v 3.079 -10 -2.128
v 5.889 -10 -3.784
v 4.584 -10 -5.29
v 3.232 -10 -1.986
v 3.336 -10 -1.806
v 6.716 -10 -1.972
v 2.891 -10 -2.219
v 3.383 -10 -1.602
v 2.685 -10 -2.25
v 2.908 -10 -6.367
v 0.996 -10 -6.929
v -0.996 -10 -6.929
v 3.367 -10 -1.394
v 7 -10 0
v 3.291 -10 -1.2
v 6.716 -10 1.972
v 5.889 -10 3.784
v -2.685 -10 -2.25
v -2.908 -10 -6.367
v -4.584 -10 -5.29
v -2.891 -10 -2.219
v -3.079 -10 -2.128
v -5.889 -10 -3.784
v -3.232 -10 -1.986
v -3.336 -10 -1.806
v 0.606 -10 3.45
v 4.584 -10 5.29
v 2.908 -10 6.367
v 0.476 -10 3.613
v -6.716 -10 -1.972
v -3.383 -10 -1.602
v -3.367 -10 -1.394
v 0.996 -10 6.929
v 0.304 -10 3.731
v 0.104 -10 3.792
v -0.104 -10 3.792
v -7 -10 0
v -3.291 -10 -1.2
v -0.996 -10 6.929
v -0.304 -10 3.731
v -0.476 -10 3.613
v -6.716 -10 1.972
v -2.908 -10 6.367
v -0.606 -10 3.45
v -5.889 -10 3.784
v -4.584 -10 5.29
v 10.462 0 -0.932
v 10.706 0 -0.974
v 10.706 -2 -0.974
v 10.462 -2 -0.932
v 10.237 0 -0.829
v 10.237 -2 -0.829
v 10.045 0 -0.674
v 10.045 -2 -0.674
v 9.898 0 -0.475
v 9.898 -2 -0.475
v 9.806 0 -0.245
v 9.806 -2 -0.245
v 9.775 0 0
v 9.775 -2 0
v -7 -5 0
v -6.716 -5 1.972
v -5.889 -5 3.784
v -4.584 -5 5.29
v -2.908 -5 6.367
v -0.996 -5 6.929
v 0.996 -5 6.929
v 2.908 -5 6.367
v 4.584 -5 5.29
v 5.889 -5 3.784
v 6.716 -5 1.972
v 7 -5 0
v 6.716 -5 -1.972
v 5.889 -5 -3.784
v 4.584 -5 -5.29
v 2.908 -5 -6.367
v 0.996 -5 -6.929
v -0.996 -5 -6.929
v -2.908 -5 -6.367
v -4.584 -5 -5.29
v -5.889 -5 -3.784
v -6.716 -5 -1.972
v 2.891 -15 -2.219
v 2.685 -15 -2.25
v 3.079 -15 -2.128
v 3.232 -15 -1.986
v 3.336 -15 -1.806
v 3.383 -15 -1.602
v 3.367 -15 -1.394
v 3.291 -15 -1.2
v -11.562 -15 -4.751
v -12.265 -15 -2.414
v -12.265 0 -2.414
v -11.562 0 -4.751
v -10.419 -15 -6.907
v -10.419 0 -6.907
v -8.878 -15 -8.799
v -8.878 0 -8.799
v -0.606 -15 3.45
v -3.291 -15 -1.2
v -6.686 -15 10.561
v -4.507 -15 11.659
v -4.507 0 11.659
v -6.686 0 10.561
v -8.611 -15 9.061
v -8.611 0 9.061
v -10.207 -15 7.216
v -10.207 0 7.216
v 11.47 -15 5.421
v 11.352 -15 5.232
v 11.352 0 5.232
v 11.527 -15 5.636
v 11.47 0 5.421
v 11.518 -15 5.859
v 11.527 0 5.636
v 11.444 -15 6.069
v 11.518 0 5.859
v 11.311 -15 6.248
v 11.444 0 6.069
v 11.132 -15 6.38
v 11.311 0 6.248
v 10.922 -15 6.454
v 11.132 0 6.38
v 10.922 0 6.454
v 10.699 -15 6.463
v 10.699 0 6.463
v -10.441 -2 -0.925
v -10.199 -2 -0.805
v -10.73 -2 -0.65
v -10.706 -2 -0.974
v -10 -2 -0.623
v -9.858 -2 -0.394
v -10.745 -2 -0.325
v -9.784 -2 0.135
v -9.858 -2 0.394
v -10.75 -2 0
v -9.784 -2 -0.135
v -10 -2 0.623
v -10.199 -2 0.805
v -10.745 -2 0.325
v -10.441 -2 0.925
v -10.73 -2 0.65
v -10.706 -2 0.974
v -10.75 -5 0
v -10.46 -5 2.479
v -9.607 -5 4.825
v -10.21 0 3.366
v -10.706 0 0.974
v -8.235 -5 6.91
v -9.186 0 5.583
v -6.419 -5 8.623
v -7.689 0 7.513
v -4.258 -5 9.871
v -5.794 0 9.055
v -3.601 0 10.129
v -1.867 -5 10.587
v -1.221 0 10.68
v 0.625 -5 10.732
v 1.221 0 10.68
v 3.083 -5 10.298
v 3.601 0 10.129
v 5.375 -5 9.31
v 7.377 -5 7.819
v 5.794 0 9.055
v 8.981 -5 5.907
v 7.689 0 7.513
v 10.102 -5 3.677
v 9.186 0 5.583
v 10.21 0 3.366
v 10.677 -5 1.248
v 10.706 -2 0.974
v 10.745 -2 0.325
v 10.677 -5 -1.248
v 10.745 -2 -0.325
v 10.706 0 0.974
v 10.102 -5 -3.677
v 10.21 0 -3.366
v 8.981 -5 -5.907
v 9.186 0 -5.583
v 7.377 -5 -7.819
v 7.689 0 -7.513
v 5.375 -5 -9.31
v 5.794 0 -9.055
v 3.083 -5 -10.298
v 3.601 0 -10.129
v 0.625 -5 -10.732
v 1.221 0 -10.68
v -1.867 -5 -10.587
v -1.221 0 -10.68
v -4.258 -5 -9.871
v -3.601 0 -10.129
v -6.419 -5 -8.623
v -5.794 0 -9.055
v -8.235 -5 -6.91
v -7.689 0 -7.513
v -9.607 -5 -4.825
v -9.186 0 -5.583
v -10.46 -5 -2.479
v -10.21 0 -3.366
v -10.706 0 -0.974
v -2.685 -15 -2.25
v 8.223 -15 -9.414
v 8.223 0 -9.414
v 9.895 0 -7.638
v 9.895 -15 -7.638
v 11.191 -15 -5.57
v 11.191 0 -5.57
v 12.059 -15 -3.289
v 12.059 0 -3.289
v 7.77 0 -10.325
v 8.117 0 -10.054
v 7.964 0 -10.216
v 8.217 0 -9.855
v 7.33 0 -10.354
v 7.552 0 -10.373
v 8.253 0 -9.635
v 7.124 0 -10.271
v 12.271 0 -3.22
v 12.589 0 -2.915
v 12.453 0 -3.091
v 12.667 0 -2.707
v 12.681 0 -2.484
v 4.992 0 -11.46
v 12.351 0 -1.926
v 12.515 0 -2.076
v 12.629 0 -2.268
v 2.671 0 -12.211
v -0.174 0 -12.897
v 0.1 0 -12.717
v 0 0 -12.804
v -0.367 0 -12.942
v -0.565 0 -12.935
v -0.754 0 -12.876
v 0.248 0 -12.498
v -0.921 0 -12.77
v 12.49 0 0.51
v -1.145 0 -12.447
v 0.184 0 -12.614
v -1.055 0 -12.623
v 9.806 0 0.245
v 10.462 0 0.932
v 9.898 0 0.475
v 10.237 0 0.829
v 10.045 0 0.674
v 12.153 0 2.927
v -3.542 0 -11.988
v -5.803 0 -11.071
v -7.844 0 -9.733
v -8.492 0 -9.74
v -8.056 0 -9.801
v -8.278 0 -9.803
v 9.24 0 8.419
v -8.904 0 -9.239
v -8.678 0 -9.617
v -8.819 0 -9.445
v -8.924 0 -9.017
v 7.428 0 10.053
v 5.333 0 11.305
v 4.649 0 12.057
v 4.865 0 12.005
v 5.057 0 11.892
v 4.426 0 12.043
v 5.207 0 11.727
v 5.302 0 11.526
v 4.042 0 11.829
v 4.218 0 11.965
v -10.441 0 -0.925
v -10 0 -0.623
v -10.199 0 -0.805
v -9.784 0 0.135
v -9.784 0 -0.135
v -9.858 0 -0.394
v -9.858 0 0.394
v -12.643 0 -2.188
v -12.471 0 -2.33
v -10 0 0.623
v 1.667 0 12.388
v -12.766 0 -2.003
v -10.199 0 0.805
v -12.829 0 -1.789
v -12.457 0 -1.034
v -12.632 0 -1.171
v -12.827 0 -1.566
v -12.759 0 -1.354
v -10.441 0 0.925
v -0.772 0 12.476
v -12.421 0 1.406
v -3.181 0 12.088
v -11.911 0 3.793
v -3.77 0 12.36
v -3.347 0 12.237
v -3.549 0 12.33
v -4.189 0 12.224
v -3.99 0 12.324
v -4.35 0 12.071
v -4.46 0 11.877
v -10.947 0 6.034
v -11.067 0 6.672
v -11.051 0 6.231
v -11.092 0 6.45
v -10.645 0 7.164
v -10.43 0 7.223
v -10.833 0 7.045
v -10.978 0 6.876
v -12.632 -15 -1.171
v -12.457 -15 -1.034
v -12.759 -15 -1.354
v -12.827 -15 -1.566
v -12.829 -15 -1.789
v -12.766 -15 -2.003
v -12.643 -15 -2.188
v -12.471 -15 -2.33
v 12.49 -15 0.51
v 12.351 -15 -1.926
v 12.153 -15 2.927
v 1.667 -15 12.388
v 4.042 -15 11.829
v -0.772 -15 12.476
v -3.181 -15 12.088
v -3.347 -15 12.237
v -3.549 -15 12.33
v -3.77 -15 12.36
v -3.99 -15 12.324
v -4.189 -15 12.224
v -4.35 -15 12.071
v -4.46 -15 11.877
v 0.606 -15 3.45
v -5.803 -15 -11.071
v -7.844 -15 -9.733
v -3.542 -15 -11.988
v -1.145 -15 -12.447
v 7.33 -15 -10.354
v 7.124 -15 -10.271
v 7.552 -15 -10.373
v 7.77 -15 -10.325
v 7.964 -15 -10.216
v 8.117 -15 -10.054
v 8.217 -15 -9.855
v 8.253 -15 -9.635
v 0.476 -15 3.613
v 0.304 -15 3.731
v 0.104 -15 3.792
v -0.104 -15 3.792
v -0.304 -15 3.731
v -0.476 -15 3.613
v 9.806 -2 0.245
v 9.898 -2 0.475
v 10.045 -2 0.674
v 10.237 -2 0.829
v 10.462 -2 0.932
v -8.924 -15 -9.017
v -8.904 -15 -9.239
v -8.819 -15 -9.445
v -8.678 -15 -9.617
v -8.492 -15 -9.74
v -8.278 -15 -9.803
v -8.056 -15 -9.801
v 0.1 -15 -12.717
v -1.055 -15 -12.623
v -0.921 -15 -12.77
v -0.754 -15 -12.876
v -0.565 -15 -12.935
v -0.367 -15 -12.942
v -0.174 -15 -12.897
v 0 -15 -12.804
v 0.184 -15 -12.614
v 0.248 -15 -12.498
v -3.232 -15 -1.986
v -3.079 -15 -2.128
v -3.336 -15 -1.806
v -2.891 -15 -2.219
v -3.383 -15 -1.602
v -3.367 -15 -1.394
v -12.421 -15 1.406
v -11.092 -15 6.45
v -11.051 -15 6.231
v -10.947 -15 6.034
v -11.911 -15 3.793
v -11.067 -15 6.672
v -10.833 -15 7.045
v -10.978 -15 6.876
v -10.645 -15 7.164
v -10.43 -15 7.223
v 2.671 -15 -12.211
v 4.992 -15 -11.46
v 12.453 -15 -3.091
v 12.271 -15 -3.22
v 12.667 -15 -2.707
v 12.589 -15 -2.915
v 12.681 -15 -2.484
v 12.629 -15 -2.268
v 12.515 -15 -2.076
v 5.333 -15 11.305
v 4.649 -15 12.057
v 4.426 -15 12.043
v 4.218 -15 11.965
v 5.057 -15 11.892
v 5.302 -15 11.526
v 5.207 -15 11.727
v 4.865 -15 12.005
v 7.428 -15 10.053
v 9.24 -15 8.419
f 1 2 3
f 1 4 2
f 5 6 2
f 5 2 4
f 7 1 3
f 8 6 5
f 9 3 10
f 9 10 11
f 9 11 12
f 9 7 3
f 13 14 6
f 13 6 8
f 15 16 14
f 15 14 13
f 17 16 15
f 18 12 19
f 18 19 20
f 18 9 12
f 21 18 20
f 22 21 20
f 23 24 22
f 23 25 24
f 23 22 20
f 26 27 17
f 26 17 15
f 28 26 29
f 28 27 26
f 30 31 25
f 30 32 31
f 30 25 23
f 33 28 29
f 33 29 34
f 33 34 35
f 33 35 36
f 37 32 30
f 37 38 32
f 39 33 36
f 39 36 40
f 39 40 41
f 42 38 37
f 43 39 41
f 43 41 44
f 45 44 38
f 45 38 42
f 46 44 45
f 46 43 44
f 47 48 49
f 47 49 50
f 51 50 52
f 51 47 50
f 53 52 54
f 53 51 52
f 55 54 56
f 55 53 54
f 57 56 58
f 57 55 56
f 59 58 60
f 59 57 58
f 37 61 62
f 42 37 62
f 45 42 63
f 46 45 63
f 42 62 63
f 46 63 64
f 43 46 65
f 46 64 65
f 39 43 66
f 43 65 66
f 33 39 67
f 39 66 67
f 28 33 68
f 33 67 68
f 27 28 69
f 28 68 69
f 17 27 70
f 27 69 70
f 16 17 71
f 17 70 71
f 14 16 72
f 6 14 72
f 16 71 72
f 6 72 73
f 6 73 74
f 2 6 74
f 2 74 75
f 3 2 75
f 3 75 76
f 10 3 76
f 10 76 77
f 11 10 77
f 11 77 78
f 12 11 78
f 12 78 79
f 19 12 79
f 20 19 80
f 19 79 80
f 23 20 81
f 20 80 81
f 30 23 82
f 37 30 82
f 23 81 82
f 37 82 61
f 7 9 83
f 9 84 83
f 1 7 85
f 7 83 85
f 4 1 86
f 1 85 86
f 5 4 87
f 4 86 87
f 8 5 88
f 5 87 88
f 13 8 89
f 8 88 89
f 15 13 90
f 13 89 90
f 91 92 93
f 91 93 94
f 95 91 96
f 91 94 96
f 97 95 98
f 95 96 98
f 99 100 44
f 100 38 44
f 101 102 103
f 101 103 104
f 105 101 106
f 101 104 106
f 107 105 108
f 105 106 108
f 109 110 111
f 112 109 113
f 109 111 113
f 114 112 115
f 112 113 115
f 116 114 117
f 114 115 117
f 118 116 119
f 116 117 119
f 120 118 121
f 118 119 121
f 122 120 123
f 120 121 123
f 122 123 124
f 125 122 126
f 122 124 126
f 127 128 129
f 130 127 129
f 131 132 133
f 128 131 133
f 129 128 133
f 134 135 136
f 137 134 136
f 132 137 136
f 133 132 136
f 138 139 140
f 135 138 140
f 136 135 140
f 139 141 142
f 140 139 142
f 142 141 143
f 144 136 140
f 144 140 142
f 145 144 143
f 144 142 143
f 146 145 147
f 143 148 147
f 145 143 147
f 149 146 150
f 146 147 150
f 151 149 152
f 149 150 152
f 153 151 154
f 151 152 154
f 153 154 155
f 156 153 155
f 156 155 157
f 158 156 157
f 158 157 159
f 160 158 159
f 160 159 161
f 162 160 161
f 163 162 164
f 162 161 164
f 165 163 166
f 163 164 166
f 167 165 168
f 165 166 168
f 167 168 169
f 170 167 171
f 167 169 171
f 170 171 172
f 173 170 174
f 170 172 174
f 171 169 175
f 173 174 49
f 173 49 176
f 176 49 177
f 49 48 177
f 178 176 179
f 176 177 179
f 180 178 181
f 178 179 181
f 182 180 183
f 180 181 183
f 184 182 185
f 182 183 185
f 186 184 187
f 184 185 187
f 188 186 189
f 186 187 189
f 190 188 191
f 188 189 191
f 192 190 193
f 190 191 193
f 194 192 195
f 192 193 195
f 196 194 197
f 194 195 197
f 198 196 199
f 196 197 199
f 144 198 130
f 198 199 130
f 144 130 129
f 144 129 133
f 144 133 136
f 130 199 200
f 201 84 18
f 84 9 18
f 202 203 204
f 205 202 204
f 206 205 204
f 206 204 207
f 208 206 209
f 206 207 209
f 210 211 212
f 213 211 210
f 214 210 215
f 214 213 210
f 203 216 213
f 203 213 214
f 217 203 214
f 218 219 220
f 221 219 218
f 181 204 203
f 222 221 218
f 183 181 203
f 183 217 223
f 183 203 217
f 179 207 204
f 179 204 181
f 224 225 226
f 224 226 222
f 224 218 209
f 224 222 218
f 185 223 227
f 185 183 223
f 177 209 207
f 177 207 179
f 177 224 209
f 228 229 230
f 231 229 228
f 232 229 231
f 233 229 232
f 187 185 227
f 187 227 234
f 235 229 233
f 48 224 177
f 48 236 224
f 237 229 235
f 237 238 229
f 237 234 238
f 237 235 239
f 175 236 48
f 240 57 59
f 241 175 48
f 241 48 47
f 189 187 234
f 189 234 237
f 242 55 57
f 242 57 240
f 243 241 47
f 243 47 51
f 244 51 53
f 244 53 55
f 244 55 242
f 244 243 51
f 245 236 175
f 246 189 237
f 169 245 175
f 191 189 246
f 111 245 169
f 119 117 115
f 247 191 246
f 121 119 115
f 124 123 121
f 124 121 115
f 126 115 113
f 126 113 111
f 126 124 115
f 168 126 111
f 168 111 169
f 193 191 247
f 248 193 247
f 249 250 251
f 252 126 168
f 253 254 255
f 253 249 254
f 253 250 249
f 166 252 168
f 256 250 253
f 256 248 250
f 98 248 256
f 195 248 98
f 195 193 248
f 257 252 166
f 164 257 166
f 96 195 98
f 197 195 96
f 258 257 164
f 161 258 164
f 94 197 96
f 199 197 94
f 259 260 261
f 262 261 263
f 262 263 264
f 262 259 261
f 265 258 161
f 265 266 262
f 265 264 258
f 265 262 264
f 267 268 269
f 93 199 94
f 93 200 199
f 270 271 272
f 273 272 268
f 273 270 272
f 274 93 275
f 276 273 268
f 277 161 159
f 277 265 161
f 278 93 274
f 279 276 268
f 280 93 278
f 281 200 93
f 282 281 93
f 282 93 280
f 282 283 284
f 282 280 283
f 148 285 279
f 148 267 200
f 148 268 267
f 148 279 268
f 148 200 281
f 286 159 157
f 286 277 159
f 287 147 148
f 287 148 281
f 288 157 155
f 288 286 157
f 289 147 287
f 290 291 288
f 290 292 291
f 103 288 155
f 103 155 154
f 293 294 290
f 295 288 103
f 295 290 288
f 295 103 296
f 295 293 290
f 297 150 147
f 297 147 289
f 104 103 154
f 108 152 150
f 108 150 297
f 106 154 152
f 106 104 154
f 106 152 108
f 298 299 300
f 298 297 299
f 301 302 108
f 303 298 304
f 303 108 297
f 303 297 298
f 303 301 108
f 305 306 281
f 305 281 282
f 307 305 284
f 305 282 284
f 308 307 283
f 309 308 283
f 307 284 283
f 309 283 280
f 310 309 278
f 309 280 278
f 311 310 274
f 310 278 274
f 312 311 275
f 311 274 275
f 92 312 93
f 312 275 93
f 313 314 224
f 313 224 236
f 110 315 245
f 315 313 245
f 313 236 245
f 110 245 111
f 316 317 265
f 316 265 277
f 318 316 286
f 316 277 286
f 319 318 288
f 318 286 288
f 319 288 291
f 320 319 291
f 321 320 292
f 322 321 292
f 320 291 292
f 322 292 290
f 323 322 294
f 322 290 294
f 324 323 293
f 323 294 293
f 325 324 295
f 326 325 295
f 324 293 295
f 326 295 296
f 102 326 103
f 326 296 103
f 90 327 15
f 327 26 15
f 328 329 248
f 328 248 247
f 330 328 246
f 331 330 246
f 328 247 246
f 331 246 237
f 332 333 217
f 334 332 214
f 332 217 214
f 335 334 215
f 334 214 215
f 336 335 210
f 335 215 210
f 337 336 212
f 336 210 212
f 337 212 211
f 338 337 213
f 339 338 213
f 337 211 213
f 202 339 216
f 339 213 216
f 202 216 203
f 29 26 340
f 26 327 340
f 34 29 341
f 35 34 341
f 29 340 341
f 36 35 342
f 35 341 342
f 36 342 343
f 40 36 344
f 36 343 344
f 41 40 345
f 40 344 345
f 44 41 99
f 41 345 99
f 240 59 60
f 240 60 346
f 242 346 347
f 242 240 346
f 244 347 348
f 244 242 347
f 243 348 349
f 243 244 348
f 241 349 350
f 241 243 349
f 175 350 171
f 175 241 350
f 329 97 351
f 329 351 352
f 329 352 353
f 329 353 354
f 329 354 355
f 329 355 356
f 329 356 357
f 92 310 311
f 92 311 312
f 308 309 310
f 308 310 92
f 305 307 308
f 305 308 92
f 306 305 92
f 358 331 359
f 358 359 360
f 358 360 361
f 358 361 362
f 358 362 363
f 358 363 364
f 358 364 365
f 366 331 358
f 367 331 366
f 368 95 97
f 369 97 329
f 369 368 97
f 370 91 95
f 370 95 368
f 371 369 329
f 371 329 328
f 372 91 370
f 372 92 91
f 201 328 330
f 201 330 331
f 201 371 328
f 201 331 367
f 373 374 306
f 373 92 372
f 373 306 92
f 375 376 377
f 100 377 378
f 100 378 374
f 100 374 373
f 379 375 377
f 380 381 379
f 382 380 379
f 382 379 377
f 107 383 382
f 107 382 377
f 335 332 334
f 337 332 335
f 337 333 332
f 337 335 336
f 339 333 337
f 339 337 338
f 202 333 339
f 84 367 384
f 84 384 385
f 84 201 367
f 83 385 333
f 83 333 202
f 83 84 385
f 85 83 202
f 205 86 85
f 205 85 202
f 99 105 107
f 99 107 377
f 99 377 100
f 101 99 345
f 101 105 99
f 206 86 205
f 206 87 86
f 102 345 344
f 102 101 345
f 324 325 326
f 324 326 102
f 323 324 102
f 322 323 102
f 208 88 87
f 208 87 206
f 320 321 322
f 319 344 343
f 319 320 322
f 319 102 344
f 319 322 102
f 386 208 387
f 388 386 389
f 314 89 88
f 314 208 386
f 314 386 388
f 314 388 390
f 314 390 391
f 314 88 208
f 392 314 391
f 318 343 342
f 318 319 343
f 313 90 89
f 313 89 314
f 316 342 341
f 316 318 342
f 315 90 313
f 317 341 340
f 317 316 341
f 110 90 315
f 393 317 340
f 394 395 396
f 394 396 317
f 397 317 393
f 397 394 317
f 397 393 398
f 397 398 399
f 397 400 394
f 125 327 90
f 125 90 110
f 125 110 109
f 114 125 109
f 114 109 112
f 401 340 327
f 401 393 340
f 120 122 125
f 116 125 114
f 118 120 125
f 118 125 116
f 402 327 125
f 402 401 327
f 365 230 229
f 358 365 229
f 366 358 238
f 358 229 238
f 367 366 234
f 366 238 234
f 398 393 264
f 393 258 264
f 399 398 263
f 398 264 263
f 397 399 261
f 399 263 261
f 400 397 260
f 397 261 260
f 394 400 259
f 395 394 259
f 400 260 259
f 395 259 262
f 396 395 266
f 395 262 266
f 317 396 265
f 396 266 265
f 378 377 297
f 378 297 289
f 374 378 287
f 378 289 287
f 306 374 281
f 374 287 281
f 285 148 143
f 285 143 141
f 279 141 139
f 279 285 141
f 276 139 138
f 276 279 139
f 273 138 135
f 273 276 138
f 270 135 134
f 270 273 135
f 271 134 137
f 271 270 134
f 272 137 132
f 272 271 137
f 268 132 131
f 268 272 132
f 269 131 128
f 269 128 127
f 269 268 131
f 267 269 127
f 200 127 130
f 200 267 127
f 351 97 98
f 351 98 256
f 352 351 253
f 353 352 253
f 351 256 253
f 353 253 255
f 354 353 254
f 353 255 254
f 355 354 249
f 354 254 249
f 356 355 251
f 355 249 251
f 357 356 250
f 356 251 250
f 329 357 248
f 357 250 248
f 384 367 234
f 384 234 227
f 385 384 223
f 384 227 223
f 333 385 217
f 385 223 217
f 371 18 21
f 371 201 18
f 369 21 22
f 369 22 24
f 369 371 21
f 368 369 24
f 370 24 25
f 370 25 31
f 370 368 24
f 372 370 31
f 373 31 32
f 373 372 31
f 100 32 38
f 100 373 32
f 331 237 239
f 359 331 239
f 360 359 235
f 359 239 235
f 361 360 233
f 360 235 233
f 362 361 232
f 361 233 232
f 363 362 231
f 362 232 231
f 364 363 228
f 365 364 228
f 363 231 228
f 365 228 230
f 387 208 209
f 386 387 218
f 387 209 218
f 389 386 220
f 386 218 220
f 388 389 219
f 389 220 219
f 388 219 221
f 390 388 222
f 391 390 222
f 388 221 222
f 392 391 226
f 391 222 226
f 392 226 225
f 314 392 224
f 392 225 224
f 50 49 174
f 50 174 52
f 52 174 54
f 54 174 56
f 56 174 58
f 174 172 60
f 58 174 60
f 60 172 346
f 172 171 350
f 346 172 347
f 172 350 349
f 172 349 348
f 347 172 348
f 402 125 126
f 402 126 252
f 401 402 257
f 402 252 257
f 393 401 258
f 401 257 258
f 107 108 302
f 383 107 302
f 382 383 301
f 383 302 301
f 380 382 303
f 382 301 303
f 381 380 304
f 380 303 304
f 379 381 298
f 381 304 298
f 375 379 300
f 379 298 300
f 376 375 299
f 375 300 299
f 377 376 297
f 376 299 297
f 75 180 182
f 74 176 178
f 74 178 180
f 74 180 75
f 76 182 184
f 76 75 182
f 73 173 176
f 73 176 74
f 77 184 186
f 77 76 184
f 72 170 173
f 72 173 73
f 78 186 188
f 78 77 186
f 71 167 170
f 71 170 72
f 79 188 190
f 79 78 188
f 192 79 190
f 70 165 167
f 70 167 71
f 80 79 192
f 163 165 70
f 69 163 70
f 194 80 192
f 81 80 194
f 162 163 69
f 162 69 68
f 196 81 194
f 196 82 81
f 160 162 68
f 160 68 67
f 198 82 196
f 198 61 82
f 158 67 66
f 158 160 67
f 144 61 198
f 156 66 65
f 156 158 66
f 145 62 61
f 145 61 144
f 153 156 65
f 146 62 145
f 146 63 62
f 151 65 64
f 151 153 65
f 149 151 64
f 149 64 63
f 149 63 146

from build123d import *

# Parameters (mm, degrees)
F0_R      = 12.5
F1_DEPTH  = 15
F2_R      = 10.75
F3_DEPTH  = 5
F4_R      = 7
F5_DEPTH  = 5
F6_R      = 0.7
F8_DEPTH  = 2
F9_R      = 0.75
F10_DEPTH = 15


with BuildPart() as f1:
    # F0 (on Front) → F1 (new body)
    with BuildSketch(Plane.XZ):
        Circle(F0_R)
        Polygon((-3.897114317, -2.25), (0, 4.5), (3.897114317, -2.25), align=None, mode=Mode.SUBTRACT)
    extrude(amount=F1_DEPTH)

    # F2 (on face) → F3 (cut)
    with BuildSketch(Plane(origin=(0, 0, 0), x_dir=(-1, 0, 0), z_dir=(0, 1, 0))):
        Circle(F2_R)
        Polygon((-3.897114317, -2.25), (0, 4.5), (3.897114317, -2.25), align=None, mode=Mode.SUBTRACT)
    extrude(amount=-F3_DEPTH, mode=Mode.SUBTRACT)

    # F4 (on face) → F5 (cut)
    with BuildSketch(Plane(origin=(0, -5, 0), x_dir=(-1, 0, 0), z_dir=(0, 1, 0))):
        Circle(F4_R)
    extrude(amount=-F5_DEPTH, mode=Mode.SUBTRACT)

    # F6
    f6_edges = [f1.edges().sort_by_distance(p)[0] for p in [
        (0, -12.5, 4.5),
        (-3.897114, -12.5, -2.25),
        (3.897114, -12.5, -2.25),
    ]]
    fillet(f6_edges, radius=F6_R)

    # F7 (on face) → F8 (join)
    with BuildSketch(Plane(origin=(0, 0, 0), x_dir=(-1, 0, 0), z_dir=(0, 1, 0))):
        with BuildLine():
            ThreePointArc((-10.7057848837, -0.973996932), (-10.0451118038, -0.6736153434), (-9.775, 0))
            ThreePointArc((-9.775, 0), (-10.0451118038, 0.6736153434), (-10.7057848837, 0.973996932))
            ThreePointArc((-10.7057848837, 0.973996932), (-10.75, 0), (-10.7057848837, -0.973996932))
        make_face()
        with BuildLine():
            ThreePointArc((10.75, 0), (10.738940532, 0.4875), (10.7057848837, 0.973996932))
            ThreePointArc((10.7057848837, 0.973996932), (9.775, 0), (10.7057848837, -0.973996932))
            ThreePointArc((10.7057848837, -0.973996932), (10.738940532, -0.4875), (10.75, 0))
        make_face()
    extrude(amount=-F8_DEPTH)

    # F9 (on Front) → F10 (join)
    with BuildSketch(Plane.XZ):
        with Locations((-10.3421816602, 6.477789022)):
            Circle(F9_R)
        with BuildLine():
            ThreePointArc((0.3111609767, -12.1954865593), (0.2288544945, -11.8538941615), (0, -11.5872758133))
            Line((0, -11.5872758133), (0, -12.8036973054))
            ThreePointArc((0, -12.8036973054), (0.2288544945, -12.5370789572), (0.3111609767, -12.1954865593))
        make_face()
        with BuildLine():
            Line((0, -12.8036973054), (0, -11.5872758133))
            ThreePointArc((0, -11.5872758133), (-1.1888390233, -12.1954865593), (0, -12.8036973054))
        make_face()
        with Locations((-12.0864133121, -1.6855519443)):
            Circle(F9_R)
        with Locations((-8.1752778497, -9.0602044231)):
            Circle(F9_R)
        with Locations((7.5029374592, -9.6243649967)):
            Circle(F9_R)
        with Locations((11.9340061187, -2.5498960893)):
            Circle(F9_R)
        with Locations((10.7810206836, 5.7176975373)):
            Circle(F9_R)
        with Locations((4.5834758529, 11.309916941)):
            Circle(F9_R)
        with Locations((-3.758728269, 11.6101005123)):
            Circle(F9_R)
    extrude(amount=F10_DEPTH)


solid = f1.part
